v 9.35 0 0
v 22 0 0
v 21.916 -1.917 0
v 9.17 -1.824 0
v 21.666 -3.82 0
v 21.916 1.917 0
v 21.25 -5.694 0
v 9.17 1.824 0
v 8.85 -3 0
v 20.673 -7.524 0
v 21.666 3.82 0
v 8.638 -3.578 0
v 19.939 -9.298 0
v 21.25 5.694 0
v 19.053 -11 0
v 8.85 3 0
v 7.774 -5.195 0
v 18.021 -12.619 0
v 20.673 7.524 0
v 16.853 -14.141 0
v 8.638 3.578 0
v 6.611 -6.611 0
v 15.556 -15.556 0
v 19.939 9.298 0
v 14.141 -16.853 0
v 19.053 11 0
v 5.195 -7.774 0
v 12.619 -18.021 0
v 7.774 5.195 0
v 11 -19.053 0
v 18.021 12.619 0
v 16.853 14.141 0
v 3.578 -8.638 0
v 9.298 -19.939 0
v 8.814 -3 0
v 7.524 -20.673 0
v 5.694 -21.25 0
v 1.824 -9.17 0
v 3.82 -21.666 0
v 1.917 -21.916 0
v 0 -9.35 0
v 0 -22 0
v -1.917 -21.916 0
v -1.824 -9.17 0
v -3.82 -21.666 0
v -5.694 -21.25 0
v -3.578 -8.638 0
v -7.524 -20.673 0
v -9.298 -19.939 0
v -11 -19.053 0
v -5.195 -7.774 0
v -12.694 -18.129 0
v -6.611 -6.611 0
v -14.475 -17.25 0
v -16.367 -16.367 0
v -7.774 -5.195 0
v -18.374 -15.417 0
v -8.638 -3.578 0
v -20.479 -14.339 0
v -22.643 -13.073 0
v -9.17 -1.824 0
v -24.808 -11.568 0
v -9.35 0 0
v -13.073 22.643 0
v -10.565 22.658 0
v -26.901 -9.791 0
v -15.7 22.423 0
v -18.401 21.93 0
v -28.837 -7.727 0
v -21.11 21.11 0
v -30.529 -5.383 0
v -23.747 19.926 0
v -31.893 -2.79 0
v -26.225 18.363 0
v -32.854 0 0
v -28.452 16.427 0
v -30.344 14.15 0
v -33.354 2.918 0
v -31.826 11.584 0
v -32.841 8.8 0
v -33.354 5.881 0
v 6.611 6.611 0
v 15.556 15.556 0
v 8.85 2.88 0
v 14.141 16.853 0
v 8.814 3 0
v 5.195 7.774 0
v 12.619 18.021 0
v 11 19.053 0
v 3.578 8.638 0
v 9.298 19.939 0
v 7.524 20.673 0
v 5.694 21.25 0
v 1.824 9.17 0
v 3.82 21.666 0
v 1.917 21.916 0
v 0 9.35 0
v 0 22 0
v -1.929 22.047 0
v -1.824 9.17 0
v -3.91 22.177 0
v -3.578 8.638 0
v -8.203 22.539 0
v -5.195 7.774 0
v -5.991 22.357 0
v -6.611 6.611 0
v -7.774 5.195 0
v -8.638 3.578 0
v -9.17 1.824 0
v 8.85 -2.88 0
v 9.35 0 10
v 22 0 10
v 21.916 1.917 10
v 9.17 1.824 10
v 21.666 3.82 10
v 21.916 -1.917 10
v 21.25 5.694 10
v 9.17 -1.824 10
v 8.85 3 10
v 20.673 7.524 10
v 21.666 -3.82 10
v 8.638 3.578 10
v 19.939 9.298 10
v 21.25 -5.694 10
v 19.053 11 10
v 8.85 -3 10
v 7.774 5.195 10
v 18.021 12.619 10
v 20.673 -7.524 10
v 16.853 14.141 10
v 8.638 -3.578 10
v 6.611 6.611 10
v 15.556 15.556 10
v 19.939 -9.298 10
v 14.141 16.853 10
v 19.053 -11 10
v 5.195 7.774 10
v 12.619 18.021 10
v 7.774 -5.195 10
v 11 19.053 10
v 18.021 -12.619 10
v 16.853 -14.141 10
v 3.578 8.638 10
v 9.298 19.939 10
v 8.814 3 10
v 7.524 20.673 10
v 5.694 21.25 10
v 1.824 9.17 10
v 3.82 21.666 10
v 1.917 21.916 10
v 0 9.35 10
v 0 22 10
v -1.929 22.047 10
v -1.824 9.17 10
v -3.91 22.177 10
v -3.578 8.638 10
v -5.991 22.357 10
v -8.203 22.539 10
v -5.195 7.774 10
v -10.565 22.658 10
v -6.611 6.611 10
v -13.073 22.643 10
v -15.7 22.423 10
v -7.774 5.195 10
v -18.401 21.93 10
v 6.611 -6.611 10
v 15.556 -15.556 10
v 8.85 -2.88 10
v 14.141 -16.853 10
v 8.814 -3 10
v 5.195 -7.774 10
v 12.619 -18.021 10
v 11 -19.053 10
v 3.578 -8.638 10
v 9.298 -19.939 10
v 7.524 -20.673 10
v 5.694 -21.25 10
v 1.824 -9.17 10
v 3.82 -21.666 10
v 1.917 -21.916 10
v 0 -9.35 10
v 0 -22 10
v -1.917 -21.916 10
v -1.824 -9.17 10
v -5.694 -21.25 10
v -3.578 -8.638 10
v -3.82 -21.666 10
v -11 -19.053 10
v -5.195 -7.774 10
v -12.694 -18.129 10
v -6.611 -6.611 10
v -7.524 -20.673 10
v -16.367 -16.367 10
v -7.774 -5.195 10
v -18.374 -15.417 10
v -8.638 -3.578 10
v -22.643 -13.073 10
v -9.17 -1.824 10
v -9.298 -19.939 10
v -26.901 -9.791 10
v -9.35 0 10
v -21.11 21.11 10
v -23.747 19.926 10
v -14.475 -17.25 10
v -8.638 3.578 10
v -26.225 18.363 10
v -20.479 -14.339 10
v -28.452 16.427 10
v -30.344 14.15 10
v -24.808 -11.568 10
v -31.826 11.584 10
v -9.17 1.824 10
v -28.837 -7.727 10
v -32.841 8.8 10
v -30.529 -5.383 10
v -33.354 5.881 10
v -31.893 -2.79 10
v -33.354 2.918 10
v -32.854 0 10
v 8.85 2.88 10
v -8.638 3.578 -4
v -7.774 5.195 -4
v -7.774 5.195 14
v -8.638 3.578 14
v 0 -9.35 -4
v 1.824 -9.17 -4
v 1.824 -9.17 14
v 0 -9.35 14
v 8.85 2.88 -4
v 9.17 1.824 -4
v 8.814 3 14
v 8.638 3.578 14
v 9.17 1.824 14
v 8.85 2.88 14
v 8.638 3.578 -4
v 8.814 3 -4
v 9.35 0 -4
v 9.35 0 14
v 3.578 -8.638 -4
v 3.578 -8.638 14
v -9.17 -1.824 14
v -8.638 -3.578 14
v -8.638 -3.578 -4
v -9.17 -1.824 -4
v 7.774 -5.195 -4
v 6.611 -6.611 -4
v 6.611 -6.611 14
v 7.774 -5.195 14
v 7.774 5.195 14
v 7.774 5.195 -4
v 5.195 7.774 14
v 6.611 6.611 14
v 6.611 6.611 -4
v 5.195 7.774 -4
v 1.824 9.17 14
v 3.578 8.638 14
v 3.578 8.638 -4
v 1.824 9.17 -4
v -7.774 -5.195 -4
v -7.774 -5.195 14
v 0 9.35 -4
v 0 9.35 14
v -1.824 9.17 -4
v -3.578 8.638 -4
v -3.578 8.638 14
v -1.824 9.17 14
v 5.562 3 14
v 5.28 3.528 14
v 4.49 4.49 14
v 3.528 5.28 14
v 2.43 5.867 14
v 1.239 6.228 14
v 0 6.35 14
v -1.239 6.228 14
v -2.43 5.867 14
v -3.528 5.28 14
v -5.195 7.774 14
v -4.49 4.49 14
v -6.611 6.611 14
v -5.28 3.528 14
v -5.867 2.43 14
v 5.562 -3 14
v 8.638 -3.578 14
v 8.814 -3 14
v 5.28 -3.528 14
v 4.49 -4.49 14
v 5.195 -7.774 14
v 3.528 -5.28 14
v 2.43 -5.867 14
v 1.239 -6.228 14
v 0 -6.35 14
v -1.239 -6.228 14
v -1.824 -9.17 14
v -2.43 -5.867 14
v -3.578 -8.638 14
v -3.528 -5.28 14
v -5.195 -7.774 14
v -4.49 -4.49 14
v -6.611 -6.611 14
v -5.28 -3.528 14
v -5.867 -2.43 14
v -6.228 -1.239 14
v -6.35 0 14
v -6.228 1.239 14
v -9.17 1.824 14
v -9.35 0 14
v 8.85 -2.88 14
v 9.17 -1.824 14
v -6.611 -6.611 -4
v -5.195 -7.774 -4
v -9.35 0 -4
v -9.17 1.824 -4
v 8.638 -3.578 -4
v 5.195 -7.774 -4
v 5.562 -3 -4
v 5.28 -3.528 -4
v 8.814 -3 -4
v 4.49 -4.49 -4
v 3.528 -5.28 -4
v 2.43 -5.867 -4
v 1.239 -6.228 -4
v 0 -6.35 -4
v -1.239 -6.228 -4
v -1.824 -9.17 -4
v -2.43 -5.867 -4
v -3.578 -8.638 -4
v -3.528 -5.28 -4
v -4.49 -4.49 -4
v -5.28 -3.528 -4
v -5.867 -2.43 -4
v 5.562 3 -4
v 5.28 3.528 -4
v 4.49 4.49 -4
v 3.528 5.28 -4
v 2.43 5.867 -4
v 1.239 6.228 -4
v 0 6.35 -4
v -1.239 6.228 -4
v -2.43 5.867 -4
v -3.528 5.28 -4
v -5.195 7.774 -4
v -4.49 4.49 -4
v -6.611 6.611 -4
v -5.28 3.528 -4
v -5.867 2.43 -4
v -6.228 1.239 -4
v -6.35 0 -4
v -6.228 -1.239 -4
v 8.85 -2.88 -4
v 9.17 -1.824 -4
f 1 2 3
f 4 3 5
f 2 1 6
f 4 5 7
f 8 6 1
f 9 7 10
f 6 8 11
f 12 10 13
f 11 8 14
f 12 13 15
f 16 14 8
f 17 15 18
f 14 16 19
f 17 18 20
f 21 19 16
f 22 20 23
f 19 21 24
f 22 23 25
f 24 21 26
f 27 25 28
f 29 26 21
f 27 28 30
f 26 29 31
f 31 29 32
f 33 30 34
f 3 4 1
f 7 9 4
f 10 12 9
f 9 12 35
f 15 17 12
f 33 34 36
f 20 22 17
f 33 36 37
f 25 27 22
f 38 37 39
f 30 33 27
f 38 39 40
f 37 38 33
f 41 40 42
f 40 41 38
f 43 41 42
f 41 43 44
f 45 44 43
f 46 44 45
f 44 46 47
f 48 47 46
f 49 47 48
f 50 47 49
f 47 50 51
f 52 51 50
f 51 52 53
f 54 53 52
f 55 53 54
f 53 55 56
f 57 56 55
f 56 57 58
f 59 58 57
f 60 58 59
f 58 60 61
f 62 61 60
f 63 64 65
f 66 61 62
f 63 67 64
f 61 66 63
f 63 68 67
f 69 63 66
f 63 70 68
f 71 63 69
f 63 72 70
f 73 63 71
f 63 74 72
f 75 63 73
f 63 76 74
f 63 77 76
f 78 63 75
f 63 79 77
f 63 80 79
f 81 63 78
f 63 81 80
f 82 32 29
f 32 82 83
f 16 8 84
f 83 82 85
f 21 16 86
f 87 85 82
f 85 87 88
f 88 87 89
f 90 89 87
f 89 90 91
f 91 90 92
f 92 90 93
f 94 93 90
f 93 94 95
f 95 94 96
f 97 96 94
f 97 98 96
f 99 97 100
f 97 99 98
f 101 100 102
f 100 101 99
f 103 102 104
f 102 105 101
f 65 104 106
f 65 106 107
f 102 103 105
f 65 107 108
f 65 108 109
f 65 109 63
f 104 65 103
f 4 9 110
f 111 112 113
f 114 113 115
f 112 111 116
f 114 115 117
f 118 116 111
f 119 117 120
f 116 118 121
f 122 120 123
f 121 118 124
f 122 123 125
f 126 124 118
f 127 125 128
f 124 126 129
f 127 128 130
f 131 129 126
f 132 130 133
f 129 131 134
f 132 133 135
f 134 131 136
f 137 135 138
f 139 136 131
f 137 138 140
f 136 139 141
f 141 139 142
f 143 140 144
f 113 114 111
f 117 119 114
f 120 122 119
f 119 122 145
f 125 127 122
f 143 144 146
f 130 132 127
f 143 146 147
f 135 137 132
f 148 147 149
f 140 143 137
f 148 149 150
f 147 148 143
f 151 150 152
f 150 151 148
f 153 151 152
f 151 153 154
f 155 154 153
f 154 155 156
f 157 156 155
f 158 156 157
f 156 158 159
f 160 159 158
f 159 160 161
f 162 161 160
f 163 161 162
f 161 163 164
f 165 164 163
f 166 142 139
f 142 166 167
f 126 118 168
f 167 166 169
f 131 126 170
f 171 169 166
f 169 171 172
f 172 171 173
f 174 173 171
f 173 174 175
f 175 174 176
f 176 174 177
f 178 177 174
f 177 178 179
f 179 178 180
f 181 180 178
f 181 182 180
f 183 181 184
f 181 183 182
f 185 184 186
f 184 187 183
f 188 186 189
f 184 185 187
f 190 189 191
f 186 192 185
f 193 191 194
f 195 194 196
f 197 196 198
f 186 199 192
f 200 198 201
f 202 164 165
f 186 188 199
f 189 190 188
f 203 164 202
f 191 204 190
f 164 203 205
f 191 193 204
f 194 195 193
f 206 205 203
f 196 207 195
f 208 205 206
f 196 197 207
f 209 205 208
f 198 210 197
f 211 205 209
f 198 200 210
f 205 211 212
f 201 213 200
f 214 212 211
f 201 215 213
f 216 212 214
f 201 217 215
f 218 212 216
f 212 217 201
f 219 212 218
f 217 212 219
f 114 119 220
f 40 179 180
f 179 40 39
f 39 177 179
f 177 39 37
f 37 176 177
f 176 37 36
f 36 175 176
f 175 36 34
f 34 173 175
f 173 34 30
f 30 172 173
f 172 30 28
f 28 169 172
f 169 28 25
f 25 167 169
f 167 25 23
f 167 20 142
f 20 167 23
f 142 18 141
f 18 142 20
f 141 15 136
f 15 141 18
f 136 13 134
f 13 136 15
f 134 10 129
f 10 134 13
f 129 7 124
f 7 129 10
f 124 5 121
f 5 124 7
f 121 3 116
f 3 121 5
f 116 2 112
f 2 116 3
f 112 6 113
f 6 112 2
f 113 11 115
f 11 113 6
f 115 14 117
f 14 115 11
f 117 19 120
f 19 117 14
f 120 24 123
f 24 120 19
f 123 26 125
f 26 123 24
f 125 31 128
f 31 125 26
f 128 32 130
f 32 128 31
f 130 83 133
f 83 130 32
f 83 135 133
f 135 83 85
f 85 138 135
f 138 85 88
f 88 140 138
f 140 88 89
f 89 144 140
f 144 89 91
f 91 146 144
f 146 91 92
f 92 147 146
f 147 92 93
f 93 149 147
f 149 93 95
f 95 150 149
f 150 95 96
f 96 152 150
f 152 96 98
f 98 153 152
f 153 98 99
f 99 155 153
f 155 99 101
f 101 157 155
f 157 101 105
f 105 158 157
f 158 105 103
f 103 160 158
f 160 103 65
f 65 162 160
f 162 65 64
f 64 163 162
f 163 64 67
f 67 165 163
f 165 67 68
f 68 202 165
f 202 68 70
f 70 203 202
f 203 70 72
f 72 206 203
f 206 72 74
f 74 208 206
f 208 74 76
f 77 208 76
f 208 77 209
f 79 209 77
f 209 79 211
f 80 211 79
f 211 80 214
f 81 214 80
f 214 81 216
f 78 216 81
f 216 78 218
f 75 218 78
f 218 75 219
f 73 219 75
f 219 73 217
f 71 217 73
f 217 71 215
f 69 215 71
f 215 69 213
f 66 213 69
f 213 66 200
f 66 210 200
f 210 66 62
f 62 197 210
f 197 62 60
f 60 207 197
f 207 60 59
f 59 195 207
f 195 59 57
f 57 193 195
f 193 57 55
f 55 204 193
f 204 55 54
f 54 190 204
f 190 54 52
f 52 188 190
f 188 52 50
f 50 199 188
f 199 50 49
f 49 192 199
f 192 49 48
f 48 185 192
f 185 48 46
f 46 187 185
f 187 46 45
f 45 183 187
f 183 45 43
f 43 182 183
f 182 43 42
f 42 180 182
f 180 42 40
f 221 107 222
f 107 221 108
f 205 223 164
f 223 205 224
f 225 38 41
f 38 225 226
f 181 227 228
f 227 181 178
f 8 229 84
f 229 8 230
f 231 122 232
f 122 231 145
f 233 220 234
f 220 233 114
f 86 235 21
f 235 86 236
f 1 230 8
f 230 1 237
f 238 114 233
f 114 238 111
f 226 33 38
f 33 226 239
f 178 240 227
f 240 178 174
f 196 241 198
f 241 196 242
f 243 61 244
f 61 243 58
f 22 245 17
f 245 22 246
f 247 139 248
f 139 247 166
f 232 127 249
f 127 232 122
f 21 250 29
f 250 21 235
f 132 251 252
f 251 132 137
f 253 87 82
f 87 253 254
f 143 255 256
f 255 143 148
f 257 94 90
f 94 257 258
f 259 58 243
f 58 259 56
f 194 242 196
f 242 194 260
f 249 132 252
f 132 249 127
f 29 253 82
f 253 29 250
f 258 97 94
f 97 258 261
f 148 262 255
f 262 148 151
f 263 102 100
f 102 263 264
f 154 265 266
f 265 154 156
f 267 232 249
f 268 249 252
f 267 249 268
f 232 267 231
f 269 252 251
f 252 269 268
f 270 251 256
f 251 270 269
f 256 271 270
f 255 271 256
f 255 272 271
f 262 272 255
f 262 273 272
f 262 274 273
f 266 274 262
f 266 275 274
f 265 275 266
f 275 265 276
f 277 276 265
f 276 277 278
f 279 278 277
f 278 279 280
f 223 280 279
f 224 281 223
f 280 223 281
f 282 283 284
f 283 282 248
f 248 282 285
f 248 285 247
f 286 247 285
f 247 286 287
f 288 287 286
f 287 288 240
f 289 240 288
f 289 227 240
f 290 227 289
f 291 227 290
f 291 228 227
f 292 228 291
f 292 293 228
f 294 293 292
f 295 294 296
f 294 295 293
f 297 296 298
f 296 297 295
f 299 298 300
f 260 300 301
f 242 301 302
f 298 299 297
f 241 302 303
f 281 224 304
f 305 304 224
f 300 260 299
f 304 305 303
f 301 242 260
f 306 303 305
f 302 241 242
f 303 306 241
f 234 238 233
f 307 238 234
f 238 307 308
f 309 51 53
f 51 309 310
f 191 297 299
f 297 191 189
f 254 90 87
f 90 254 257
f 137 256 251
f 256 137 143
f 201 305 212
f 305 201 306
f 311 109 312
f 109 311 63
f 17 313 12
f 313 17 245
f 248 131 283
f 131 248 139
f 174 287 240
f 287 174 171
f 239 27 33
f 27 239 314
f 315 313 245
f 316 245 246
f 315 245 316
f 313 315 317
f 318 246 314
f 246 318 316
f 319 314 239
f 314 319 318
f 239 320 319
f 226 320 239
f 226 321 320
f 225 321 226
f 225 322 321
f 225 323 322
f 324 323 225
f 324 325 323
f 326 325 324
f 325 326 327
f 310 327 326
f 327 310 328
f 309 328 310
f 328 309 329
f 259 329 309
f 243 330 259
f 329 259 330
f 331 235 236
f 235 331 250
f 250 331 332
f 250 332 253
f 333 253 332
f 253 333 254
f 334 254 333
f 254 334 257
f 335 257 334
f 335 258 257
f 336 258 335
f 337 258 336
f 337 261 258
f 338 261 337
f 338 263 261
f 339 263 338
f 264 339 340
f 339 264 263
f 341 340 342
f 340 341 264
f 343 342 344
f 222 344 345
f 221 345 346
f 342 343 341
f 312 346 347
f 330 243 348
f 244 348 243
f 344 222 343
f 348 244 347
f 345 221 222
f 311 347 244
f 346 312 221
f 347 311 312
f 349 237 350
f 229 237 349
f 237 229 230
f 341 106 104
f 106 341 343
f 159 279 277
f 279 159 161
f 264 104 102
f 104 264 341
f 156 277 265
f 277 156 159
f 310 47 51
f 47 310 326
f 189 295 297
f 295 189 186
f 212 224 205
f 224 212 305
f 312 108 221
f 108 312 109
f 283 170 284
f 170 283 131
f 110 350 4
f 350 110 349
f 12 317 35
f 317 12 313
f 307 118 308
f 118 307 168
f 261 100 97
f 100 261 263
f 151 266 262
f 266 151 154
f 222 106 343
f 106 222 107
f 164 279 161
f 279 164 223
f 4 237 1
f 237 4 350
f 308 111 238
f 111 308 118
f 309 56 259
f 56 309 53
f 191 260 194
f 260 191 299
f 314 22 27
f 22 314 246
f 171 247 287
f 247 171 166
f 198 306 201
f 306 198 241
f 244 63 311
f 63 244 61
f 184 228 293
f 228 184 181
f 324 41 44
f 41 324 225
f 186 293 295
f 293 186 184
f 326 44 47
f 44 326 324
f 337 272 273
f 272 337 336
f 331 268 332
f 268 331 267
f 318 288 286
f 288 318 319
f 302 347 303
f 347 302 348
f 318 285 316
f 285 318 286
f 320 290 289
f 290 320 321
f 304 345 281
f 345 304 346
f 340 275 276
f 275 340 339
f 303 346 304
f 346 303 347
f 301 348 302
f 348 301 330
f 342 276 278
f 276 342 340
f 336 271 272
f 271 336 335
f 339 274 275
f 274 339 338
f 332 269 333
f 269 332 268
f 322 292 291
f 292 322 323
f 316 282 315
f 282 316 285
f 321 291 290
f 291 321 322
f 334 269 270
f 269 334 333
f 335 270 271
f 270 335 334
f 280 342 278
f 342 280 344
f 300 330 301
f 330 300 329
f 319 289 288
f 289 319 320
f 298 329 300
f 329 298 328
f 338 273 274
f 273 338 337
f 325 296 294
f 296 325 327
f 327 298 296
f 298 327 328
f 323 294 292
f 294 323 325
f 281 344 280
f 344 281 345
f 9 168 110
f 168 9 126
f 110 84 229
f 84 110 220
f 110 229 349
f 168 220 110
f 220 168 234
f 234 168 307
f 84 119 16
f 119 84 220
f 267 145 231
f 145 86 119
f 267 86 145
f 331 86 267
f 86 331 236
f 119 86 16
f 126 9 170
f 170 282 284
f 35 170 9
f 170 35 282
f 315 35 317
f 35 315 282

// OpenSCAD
$fn = 32;

// ----------------------------------------------------------------------
// Cam: base radius 22 mm with a 12 mm lift over 150 degrees
// ----------------------------------------------------------------------

// --- parameters (mm) ---
base_r = 22;              // base radius
lift = 12;                // lift height above the base radius
lift_span = 150;          // angular width of the lift
lift_start = 90;          // angle where the lift starts
cam_t = 10;               // cam plate thickness
hub_d = 18.7;             // hub diameter
hub_h = 18;               // hub height
bore_d = 12.7;            // bore
key_w = 6;                // keyway width
key_depth = 1.6;          // keyway depth

cam_profile = [[22, 0], [21.916, 1.917], [21.666, 3.82], [21.25, 5.694], [20.673, 7.524], [19.939, 9.298], [19.053, 11], [18.021, 12.619], [16.853, 14.141], [15.556, 15.556], [14.141, 16.853], [12.619, 18.021], [11, 19.053], [9.298, 19.939], [7.524, 20.673], [5.694, 21.25], [3.82, 21.666], [1.917, 21.916], [0, 22], [-1.929, 22.047], [-3.91, 22.177], [-5.991, 22.357], [-8.203, 22.539], [-10.565, 22.658], [-13.073, 22.643], [-15.7, 22.423], [-18.401, 21.93], [-21.11, 21.11], [-23.747, 19.926], [-26.225, 18.363], [-28.452, 16.427], [-30.344, 14.15], [-31.826, 11.584], [-32.841, 8.8], [-33.354, 5.881], [-33.354, 2.918], [-32.854, 0], [-31.893, -2.79], [-30.529, -5.383], [-28.837, -7.727], [-26.901, -9.791], [-24.808, -11.568], [-22.643, -13.073], [-20.479, -14.339], [-18.374, -15.417], [-16.367, -16.367], [-14.475, -17.25], [-12.694, -18.129], [-11, -19.053], [-9.298, -19.939], [-7.524, -20.673], [-5.694, -21.25], [-3.82, -21.666], [-1.917, -21.916], [0, -22], [1.917, -21.916], [3.82, -21.666], [5.694, -21.25], [7.524, -20.673], [9.298, -19.939], [11, -19.053], [12.619, -18.021], [14.141, -16.853], [15.556, -15.556], [16.853, -14.141], [18.021, -12.619], [19.053, -11], [19.939, -9.298], [20.673, -7.524], [21.25, -5.694], [21.666, -3.82], [21.916, -1.917]];

difference() {
  union() {
    linear_extrude(height = cam_t) polygon(cam_profile);
    /* hub, proud of the cam plate on both sides */
    translate([0, 0, -4]) cylinder(h = hub_h, d = hub_d);
  }
  /* bore through the hub, 2.5 mm clear on both faces */
  translate([0, 0, -6.5]) cylinder(h = hub_h + 5, d = bore_d);
  /* keyway, milled through the whole hub */
  translate([4.75, -3, -6.5]) cube([4.1, 6, 23]);
}
